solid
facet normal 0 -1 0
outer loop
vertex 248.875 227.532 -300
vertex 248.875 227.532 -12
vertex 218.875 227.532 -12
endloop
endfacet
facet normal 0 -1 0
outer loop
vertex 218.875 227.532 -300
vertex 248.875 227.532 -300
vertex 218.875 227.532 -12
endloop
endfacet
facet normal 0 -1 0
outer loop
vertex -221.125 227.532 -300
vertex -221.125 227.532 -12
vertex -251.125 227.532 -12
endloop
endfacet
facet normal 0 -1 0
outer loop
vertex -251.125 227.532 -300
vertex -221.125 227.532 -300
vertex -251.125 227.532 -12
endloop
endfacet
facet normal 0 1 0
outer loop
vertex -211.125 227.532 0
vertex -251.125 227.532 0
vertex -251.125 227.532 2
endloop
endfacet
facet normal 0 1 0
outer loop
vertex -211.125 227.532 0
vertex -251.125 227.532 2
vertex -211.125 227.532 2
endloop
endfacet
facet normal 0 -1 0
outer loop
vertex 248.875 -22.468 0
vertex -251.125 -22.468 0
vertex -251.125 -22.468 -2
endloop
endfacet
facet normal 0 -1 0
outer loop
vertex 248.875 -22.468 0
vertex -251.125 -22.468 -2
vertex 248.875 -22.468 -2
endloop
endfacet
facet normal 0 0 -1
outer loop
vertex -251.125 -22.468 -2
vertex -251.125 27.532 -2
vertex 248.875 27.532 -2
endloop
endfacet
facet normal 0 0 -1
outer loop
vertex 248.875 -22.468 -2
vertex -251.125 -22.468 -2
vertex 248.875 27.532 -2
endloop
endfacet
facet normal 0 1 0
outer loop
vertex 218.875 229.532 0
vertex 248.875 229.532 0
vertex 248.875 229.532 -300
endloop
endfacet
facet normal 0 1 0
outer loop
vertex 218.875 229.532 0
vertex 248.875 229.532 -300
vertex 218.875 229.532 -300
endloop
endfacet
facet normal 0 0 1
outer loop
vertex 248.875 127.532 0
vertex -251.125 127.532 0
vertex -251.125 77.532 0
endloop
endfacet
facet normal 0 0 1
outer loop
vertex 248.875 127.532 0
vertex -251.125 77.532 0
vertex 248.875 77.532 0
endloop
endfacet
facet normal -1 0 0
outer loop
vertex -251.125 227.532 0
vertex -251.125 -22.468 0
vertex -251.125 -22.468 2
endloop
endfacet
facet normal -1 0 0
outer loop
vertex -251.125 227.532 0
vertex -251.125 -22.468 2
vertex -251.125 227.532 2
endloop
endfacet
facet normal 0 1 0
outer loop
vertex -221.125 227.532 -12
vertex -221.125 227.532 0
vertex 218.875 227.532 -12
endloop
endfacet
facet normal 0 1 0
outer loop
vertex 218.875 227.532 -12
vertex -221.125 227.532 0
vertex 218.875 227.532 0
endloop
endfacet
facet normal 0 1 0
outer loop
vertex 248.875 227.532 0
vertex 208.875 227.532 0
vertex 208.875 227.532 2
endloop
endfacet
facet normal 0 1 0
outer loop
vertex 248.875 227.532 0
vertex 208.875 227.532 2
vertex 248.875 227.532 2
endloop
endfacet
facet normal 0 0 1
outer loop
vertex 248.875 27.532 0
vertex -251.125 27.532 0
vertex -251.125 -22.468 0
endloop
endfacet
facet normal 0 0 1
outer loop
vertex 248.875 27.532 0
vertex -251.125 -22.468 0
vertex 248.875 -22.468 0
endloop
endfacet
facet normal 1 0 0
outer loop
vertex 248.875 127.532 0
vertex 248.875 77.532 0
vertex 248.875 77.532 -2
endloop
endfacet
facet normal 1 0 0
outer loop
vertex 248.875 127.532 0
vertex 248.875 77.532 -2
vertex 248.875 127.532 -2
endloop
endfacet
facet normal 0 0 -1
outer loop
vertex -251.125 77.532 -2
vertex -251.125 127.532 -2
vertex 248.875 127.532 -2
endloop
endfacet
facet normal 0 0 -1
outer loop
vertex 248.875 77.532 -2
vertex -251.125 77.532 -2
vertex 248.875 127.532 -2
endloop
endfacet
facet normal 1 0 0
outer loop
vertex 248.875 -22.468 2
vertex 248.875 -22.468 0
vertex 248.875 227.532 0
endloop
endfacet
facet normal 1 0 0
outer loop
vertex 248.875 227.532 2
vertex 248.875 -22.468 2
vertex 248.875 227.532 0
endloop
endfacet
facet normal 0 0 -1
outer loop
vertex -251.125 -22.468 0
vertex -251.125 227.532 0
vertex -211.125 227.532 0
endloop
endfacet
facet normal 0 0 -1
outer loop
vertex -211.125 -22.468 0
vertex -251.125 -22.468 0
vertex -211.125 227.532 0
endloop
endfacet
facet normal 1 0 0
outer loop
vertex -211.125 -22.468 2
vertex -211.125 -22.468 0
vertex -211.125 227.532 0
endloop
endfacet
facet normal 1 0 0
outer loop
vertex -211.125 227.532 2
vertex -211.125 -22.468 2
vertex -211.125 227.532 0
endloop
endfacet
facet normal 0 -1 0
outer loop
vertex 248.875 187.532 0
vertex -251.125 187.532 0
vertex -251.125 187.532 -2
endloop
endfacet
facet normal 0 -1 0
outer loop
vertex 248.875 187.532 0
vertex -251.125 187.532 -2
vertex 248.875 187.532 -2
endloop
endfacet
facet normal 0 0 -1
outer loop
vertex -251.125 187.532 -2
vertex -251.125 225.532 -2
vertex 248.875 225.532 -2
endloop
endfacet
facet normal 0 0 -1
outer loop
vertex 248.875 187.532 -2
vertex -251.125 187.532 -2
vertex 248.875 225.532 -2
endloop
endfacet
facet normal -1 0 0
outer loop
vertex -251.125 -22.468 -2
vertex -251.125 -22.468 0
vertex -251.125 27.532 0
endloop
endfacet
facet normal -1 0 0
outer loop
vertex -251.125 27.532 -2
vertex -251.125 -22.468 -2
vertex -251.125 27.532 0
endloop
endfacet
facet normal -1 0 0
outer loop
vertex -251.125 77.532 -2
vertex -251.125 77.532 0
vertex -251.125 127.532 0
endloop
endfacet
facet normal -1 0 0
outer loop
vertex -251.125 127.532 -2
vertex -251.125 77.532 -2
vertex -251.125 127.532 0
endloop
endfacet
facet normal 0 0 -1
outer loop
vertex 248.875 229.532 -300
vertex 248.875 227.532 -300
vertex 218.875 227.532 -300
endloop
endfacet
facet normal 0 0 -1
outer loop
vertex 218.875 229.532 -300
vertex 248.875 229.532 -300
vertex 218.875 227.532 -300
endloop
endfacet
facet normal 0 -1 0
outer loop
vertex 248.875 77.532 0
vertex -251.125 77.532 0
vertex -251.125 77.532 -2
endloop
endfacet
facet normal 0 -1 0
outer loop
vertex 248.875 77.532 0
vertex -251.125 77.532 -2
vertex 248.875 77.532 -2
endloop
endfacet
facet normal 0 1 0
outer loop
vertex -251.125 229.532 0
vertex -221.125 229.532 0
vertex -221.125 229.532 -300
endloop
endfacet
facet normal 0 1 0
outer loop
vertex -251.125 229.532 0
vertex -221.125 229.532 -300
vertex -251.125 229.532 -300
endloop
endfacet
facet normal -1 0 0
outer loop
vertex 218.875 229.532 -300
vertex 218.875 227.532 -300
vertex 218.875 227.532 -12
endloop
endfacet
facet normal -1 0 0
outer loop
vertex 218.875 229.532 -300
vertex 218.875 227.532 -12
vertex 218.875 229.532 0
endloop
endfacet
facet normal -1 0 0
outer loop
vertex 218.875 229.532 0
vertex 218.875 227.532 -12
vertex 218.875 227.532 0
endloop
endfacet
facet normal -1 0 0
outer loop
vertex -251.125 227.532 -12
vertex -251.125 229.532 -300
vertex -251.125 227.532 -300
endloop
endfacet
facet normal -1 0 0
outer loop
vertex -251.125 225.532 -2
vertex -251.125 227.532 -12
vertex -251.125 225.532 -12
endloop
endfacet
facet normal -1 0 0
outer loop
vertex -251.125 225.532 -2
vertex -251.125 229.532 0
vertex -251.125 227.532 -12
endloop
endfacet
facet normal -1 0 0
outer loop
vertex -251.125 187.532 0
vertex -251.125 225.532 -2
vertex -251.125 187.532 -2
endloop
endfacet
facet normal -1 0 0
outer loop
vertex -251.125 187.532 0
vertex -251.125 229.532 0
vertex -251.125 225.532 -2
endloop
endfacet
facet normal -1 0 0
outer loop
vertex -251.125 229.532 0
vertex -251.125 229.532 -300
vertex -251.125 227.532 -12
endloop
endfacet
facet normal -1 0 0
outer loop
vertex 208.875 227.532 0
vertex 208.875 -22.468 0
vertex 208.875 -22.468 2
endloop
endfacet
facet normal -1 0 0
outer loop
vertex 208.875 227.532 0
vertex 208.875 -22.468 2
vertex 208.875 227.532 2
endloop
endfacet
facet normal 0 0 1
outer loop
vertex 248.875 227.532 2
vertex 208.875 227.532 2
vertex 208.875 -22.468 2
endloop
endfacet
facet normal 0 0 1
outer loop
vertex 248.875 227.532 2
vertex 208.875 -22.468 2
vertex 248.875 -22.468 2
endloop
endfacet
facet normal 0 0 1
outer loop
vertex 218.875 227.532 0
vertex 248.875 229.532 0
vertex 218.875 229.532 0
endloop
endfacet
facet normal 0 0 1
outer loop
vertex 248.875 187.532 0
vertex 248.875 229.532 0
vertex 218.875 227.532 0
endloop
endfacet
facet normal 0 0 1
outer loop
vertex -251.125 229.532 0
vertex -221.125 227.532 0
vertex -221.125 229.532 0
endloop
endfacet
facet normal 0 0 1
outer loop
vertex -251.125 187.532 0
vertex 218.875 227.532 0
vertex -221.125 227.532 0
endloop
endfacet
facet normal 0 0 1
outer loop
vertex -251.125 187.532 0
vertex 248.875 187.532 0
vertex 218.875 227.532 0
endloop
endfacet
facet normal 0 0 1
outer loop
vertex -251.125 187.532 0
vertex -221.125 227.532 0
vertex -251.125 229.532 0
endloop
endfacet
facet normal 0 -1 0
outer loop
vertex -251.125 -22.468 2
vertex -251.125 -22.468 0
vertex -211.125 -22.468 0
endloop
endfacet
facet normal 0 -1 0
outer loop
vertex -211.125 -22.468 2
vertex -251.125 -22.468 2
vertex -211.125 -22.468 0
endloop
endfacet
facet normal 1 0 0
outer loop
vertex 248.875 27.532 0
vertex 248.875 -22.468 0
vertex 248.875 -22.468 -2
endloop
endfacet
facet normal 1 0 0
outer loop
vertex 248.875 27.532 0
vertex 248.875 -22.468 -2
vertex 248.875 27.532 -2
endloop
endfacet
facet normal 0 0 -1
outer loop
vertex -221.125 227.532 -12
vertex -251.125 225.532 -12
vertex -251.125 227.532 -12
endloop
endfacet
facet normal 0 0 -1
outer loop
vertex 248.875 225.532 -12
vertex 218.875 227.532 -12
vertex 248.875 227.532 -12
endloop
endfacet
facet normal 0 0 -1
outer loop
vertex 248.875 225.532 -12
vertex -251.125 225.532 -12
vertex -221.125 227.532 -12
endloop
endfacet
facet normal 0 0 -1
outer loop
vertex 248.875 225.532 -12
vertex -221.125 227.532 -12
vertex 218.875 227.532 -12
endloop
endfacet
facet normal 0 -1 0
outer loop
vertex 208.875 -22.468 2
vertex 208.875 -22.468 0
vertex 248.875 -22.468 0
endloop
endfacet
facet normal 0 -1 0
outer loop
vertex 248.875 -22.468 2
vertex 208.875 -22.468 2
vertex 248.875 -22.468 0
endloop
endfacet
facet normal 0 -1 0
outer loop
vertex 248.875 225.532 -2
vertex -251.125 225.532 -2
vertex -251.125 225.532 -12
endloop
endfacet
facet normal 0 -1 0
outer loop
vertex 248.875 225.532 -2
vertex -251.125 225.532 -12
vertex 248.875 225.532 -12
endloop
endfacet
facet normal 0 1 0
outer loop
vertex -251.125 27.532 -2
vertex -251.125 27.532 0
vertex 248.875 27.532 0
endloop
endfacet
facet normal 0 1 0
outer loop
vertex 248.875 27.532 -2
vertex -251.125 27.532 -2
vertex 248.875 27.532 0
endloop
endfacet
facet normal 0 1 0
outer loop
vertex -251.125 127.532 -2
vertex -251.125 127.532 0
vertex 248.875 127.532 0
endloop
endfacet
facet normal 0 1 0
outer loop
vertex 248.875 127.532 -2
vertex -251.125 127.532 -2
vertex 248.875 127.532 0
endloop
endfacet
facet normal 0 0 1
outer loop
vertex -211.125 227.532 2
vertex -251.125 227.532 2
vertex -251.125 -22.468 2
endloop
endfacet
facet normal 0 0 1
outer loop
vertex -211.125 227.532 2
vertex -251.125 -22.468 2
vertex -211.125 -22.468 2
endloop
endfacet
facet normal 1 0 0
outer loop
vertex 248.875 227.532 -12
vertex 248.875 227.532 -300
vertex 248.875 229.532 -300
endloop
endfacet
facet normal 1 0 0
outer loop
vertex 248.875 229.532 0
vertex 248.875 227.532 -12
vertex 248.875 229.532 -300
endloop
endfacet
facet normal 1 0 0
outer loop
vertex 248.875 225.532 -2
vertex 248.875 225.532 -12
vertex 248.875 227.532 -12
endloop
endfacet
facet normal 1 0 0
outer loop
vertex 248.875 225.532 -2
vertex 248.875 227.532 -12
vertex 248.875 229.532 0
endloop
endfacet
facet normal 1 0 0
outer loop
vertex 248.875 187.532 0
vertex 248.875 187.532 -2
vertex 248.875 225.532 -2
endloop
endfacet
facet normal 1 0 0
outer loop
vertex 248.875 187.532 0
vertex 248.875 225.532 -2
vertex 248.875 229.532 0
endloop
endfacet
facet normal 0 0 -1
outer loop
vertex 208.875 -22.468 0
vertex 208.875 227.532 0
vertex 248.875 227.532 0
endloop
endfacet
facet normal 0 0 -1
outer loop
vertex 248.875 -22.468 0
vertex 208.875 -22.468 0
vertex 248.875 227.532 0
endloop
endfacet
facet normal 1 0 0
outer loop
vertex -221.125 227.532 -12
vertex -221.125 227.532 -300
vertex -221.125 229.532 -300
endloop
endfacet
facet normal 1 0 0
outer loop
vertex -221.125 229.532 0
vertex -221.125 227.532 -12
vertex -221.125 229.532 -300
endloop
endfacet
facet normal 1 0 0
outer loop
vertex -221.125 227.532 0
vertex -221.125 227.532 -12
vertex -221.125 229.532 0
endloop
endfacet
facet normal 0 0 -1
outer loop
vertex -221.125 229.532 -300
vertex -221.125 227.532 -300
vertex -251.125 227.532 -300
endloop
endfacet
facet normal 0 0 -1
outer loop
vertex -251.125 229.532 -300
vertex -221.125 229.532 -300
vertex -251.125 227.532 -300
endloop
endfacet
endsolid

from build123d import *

# Parameters (mm, degrees)
F0_W      = 500
F0_H      = 40
F1_DEPTH  = 2
F2_W      = 40
F2_H      = 250
F3_DEPTH  = 2
F4_W      = 500
F4_H      = 50
F5_DEPTH  = 2
F7_W      = 500
F7_H      = 2
F8_DEPTH  = 10
F9_W      = 30
F9_H      = 300
F10_DEPTH = 2


# Not quite as in the source:
# - a feature names something its author has since deleted; it is built from what else it names


with BuildPart() as f1:
    # F0 (on Top) → F1 (new body)
    with BuildSketch(Plane.XY):
        with Locations((-1.1249929667, 207.531722784)):
            Rectangle(F0_W, F0_H)
    extrude(amount=-F1_DEPTH)

    # F7 (on face) → F8 (join)
    with BuildSketch(Plane(origin=(0, 0, -2), x_dir=(1, 0, 0), z_dir=(0, 0, -1))):
        with Locations((-1.1249929667, -226.531722784)):
            Rectangle(F7_W, F7_H)
    extrude(amount=F8_DEPTH)

    # F9 (on face) → F10 (join)
    with BuildSketch(Plane(origin=(0, 227.531722784, 0), x_dir=(-1, 0, 0), z_dir=(0, 1, 0))):
        with Locations((-233.8750070333, -150)):
            Rectangle(F9_W, F9_H)
        with Locations((236.1249929667, -150)):
            Rectangle(F9_W, F9_H)
    extrude(amount=F10_DEPTH)


with BuildPart() as f3:
    # F2 (on Top) → F3 (new body)
    with BuildSketch(Plane.XY):
        with Locations((-231.1249929667, 102.531722784)):
            Rectangle(F2_W, F2_H)
    extrude(amount=F3_DEPTH)


with BuildPart() as f3b:
    # F2 (on Top) → F3, piece 2 (new body)
    with BuildSketch(Plane.XY):
        with Locations((228.8750070333, 102.531722784)):
            Rectangle(F2_W, F2_H)
    extrude(amount=F3_DEPTH)


with BuildPart() as f5:
    # F4 (on Top) → F5 (new body)
    with BuildSketch(Plane.XY):
        with Locations((-1.1249929667, 2.531722784)):
            Rectangle(F4_W, F4_H)
    extrude(amount=-F5_DEPTH)


with BuildPart() as f5b:
    # F4 (on Top) → F5, piece 2 (new body)
    with BuildSketch(Plane.XY):
        with Locations((-1.1249929667, 102.531722784)):
            Rectangle(F4_W, F4_H)
    extrude(amount=-F5_DEPTH)


solid = Compound([f1.part, f3.part, f3b.part, f5.part, f5b.part])
